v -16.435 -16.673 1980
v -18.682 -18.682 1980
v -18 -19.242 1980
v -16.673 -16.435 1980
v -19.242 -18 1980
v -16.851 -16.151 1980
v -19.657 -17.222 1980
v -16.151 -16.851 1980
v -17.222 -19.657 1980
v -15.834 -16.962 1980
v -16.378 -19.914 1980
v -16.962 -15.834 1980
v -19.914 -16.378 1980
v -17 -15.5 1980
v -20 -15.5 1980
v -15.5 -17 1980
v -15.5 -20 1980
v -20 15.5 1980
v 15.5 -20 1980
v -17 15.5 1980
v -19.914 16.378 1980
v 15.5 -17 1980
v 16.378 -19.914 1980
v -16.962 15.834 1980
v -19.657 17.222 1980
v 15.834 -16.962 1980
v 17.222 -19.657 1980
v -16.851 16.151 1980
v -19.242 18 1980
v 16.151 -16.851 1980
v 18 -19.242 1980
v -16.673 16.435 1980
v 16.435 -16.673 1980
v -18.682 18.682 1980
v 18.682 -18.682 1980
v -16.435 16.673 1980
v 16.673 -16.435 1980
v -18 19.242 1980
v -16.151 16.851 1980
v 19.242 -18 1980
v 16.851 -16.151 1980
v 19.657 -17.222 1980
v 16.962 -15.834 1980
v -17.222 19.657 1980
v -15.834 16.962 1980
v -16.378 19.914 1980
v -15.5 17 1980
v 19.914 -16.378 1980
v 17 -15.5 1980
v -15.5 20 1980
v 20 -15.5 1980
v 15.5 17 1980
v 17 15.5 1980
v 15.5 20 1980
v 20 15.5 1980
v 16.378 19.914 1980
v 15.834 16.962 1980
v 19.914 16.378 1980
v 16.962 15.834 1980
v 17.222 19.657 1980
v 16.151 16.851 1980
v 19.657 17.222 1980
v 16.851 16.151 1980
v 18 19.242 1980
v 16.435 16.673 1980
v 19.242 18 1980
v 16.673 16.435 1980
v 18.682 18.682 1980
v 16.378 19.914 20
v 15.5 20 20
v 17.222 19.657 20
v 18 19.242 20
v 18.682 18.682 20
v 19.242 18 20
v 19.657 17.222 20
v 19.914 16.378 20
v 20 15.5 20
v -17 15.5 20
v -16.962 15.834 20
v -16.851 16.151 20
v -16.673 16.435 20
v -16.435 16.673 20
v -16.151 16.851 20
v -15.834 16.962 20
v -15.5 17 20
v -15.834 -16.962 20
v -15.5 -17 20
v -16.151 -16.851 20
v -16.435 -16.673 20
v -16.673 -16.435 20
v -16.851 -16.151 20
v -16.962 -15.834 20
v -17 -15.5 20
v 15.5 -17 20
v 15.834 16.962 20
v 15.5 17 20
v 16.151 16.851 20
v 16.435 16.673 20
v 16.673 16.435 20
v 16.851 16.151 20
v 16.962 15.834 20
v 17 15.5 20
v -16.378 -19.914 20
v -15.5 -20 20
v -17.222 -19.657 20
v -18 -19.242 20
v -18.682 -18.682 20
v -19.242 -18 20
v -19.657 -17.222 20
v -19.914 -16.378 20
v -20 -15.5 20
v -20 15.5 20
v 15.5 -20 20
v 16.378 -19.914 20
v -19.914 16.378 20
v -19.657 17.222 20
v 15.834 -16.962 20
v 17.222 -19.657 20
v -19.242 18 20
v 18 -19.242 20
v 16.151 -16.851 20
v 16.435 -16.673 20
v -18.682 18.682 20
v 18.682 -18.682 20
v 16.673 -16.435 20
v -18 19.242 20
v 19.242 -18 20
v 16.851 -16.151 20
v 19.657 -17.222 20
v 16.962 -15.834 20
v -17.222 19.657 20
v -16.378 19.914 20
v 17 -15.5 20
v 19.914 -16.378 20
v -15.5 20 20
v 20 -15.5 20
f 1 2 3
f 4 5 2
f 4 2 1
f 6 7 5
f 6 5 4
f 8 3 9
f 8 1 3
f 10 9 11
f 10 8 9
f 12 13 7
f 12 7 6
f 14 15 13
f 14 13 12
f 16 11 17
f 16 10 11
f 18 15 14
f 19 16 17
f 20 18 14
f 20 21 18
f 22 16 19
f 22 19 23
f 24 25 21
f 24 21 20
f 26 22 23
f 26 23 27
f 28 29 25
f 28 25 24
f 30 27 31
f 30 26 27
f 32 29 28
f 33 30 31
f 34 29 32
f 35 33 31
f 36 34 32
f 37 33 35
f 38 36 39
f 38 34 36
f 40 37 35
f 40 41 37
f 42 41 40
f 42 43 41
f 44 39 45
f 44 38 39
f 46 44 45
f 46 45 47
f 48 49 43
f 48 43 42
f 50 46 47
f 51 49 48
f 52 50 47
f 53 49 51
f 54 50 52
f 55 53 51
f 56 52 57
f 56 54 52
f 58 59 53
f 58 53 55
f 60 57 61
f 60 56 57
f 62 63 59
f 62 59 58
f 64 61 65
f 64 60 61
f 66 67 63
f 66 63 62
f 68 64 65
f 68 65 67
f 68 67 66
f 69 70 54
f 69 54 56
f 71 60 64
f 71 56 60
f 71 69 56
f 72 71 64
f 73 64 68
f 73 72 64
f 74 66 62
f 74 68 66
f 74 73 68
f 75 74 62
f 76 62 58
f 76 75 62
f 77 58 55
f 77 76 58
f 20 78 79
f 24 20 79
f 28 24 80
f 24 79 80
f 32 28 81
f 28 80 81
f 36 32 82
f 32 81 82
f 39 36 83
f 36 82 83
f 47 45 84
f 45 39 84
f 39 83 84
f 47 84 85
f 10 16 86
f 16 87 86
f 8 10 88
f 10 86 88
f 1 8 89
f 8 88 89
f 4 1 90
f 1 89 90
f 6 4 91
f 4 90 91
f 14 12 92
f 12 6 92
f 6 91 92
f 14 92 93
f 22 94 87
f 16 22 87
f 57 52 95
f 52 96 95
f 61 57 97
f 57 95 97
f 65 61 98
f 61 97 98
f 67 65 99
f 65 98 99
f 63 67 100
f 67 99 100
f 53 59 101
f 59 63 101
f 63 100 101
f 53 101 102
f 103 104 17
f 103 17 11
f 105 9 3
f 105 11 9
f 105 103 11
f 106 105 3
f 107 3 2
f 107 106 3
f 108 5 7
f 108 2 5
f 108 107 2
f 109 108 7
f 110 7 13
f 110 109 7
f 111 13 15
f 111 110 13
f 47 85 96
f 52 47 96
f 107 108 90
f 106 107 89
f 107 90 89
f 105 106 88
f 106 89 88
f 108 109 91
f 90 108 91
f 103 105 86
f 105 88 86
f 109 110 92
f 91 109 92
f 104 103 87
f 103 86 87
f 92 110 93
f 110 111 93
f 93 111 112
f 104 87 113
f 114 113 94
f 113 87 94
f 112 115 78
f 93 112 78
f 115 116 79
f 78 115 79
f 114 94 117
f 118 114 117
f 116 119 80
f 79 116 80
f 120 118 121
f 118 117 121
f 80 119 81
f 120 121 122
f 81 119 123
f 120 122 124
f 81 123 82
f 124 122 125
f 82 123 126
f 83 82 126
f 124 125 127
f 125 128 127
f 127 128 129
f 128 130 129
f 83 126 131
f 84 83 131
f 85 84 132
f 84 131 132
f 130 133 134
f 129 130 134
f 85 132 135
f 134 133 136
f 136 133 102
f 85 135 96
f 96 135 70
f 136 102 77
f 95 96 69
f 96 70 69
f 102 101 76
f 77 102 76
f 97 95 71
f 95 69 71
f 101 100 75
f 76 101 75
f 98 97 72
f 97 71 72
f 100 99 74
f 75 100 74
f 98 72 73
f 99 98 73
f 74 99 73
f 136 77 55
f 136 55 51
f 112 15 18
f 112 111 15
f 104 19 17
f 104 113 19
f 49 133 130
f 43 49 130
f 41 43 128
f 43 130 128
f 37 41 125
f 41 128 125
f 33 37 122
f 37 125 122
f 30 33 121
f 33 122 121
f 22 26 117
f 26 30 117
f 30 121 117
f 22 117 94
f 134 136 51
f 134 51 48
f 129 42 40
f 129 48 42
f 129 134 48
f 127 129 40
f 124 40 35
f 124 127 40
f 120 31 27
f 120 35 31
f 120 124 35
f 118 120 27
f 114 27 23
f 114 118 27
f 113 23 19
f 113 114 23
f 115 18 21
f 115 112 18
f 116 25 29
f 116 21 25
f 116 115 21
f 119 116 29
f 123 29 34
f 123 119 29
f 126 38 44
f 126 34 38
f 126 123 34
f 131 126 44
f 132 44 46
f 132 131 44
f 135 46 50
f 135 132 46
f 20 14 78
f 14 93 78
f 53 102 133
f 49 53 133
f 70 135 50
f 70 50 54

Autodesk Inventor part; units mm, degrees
ref_plane "Start Plane" through (0, 0, 20) normal (0, 0, 1) x (1, 0, 0)
ref_plane "End Plane" through (0, 0, 1980) normal (0, 0, 1) x (1, 0, 0)
sketch "Sketch" plane through (0, 0, 0) normal (0, 0, 1) x (1, 0, 0)
  line L0 (-20, -15.5) -> (-20, 15.5)
  line L1 (-15.5, 20) -> (15.5, 20)
  line L2 (20, 15.5) -> (20, -15.5)
  line L3 (15.5, -20) -> (-15.5, -20)
  arc A0 (-20, -15.5) -> (-15.5, -20) centre (-15.5, -15.5) ccw
  arc A1 (-15.5, 20) -> (-20, 15.5) centre (-15.5, 15.5) ccw
  arc A2 (20, 15.5) -> (15.5, 20) centre (15.5, 15.5) ccw
  arc A3 (15.5, -20) -> (20, -15.5) centre (15.5, -15.5) ccw
  arc A4 (-15.5, 17) -> (-17, 15.5) centre (-15.5, 15.5) ccw
  line L4 (-15.5, 17) -> (15.5, 17)
  arc A5 (17, 15.5) -> (15.5, 17) centre (15.5, 15.5) ccw
  line L5 (17, 15.5) -> (17, -15.5)
  arc A6 (15.5, -17) -> (17, -15.5) centre (15.5, -15.5) ccw
  line L6 (15.5, -17) -> (-15.5, -17)
  arc A7 (-17, -15.5) -> (-15.5, -17) centre (-15.5, -15.5) ccw
  line L7 (-17, -15.5) -> (-17, 15.5)
  line L8 (0, 29.3048) -> (0, -29.3048) construction
  line L9 (-29.3048, 0) -> (29.3048, 0) construction
  dimension "d7" = 4.5
  dimension "d10" = 40
  dimension "d11" = 40
  dimension "d12" = 3
  dimension "d15" = 20
  dimension "d16" = 20
extrude "Body" add sketch "Sketch" along normal up to surface (1960 mm away) from surface at 20
sketch "Sketch3" plane through (0, 0, 0) normal (0, 0, 1) x (1, 0, 0)
  line L0 (0, 0) -> (10, 0)
ref_plane "Work Plane3" through (0, 0, 0) normal (0, -1, 0) x (1, 0, 0)
ref_plane "Work Plane4" through (1200, -15.5, 1980) normal (0, 0, 1) x (1, 0, 0)
split "Split1" plane through (1200, -15.5, 1980) removes the side toward (0, 0, 1)
ref_plane "Work Plane5" through (0, -15.5, 20) normal (0, 0, -1) x (-1, 0, 0)
split "Split2" plane through (0, -15.5, 20) removes the side toward (0, 0, -1)
sketch "Sketch4" plane through (0, 0, 0) normal (0, -1, 0) x (1, 0, 0)
  line L0 (-2, 20) -> (12, 20) projected
  line L1 (-2, 1980) -> (12, 1980) projected
  dimension "d18" = 1960
equation "\"d7\" = G_IR"
equation "\"d10\" = G_H"
equation "\"d11\" = G_W"
equation "\"d12\" = G_T"
equation "\"d15\" = 0.5 * d10"
equation "\"d16\" = 0.5 * d11"
equation "\"d3\" = G_L"
equation "\"G_W\" = 40"
equation "\"G_H\" = 40"
equation "\"G_T\" = 3"
equation "\"G_IR\" = 4.5"
equation "\"G_L\" = d18"
properties part number "ISO 12633-2 - 40x40x3 - 1960" material "Steel, Mild"
